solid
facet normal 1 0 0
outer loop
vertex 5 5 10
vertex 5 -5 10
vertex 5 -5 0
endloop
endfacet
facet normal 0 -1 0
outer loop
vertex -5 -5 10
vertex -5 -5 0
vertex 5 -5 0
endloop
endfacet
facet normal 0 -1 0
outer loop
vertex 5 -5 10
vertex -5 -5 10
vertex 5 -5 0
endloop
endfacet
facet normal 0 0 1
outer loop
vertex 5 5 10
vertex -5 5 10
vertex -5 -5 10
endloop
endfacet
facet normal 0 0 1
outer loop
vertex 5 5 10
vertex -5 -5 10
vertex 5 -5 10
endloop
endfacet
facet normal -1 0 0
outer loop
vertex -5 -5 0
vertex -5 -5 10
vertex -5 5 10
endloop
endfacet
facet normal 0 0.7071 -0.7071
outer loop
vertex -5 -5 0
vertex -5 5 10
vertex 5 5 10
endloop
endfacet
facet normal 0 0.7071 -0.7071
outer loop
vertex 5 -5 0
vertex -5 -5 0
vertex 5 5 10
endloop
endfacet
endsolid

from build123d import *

# Parameters (mm, degrees)
F0_W     = 10
F0_H     = 10
F1_DEPTH = 10
F2_SIZE  = 9.99999


# Not quite as in the source:
# - a fillet or chamfer is up to 0.001 mm smaller than in the source, because OpenCascade refuses the exact size


with BuildPart() as f1:
    # F0 (on Top) → F1 (new body)
    with BuildSketch(Plane.XY):
        Rectangle(F0_W, F0_H)
    extrude(amount=F1_DEPTH)

    # F2 (size 10 in the source; OpenCascade refuses exactly that, so slightly less here)
    f2_edges = [f1.edges().sort_by_distance(p)[0] for p in [
        (0, 5, 0),
    ]]
    chamfer(f2_edges, length=F2_SIZE)


solid = f1.part
